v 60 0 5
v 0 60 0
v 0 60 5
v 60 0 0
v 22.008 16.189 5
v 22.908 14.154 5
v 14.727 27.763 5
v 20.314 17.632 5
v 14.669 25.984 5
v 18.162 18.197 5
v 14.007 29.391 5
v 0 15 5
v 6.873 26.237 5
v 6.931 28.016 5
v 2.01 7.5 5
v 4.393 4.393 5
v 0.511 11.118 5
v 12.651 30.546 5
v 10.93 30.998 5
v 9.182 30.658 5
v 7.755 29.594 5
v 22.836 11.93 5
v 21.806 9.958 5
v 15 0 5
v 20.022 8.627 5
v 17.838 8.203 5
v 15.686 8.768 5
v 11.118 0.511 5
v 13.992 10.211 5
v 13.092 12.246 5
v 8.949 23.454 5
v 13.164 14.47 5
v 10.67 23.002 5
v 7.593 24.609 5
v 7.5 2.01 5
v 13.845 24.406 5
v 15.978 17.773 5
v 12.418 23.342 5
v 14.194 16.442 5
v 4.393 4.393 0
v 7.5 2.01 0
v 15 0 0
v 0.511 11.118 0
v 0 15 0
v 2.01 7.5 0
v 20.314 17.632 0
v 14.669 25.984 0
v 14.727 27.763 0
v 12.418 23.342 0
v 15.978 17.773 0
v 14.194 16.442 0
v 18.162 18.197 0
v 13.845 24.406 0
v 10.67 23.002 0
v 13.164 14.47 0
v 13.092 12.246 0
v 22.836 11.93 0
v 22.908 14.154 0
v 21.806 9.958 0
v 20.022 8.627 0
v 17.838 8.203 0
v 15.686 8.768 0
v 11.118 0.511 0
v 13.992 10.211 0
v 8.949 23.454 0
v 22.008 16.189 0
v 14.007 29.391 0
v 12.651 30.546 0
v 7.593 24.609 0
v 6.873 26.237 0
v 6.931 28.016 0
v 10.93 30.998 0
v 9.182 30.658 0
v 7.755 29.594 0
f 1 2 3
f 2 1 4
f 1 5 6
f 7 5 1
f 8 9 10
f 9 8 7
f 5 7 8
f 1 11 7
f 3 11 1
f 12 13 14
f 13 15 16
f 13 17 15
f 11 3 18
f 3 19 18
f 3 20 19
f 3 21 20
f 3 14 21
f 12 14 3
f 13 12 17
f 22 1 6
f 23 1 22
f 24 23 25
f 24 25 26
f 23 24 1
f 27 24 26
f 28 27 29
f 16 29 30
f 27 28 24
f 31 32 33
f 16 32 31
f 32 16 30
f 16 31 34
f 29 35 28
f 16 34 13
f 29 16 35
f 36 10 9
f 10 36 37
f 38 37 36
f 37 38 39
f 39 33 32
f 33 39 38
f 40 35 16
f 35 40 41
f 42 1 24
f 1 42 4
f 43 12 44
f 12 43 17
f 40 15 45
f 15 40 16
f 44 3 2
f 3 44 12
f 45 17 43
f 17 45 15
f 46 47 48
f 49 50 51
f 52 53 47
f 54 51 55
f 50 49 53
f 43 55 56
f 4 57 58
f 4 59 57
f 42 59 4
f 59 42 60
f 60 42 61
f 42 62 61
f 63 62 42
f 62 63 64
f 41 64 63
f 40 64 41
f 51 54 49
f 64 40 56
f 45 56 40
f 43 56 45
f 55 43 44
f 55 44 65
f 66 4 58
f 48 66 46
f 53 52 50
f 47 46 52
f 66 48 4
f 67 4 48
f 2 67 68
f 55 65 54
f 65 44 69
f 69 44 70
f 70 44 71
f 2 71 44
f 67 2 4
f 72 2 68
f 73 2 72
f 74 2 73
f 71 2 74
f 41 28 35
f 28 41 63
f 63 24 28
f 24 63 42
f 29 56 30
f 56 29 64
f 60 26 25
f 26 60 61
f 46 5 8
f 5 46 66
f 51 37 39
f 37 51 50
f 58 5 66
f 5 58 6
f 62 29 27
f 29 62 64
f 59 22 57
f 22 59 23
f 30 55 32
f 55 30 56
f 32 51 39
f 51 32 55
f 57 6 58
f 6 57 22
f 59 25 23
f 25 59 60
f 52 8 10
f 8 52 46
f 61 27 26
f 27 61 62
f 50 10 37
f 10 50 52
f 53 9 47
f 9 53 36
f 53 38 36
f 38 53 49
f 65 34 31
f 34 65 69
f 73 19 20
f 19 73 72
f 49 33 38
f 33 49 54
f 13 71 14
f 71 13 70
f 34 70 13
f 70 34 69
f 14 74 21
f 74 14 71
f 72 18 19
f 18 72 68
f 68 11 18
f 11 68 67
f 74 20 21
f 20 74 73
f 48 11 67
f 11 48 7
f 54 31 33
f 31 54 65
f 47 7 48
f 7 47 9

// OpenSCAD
$fn = 32;

// ----------------------------------------------------------------------
// Bracket plate: corner pad 60 x 60, fillet R15
// ----------------------------------------------------------------------

// --- parameters (mm) ---
hole_r = 4;               // bolt hole radius
plate_t = 5;              // plate thickness, Z (extrusion height)
leg_a = 60;               // base leg
leg_b = 60;               // height leg
fillet_r = 15;            // right-angle fillet radius
fit_tol = 0.1;            // declared fit tolerance (prompt contract)
free_tol = 0.5;           // declared free tolerance (prompt contract)

hole_d1 = 2 * hole_r + 2;
hole_d2 = 2 * hole_r;

profile = [[15, 0], [60, 0], [0, 60], [0, 15], [0.511, 11.118], [2.01, 7.5], [4.393, 4.393], [7.5, 2.01], [11.118, 0.511]];  // primary outline, 9 points, counter clockwise
void_1 = [[22.908, 14.154], [22.008, 16.189], [20.314, 17.632], [18.162, 18.197], [15.978, 17.773], [14.194, 16.442], [13.164, 14.47], [13.092, 12.246], [13.992, 10.211], [15.686, 8.768], [17.838, 8.203], [20.022, 8.627], [21.806, 9.958], [22.836, 11.93]];  // mount hole 1, 14 points
void_2 = [[14.727, 27.763], [14.007, 29.391], [12.651, 30.546], [10.93, 30.998], [9.182, 30.658], [7.755, 29.594], [6.931, 28.016], [6.873, 26.237], [7.593, 24.609], [8.949, 23.454], [10.67, 23.002], [12.418, 23.342], [13.845, 24.406], [14.669, 25.984]];  // mount hole 2, 14 points

// --- the one profile operation ---
difference() {
  linear_extrude(height = plate_t) polygon(points = profile);
  translate([0, 0, -1])
    linear_extrude(height = plate_t + 2) polygon(points = void_1);
  translate([0, 0, -1])
    linear_extrude(height = plate_t + 2) polygon(points = void_2);
}
